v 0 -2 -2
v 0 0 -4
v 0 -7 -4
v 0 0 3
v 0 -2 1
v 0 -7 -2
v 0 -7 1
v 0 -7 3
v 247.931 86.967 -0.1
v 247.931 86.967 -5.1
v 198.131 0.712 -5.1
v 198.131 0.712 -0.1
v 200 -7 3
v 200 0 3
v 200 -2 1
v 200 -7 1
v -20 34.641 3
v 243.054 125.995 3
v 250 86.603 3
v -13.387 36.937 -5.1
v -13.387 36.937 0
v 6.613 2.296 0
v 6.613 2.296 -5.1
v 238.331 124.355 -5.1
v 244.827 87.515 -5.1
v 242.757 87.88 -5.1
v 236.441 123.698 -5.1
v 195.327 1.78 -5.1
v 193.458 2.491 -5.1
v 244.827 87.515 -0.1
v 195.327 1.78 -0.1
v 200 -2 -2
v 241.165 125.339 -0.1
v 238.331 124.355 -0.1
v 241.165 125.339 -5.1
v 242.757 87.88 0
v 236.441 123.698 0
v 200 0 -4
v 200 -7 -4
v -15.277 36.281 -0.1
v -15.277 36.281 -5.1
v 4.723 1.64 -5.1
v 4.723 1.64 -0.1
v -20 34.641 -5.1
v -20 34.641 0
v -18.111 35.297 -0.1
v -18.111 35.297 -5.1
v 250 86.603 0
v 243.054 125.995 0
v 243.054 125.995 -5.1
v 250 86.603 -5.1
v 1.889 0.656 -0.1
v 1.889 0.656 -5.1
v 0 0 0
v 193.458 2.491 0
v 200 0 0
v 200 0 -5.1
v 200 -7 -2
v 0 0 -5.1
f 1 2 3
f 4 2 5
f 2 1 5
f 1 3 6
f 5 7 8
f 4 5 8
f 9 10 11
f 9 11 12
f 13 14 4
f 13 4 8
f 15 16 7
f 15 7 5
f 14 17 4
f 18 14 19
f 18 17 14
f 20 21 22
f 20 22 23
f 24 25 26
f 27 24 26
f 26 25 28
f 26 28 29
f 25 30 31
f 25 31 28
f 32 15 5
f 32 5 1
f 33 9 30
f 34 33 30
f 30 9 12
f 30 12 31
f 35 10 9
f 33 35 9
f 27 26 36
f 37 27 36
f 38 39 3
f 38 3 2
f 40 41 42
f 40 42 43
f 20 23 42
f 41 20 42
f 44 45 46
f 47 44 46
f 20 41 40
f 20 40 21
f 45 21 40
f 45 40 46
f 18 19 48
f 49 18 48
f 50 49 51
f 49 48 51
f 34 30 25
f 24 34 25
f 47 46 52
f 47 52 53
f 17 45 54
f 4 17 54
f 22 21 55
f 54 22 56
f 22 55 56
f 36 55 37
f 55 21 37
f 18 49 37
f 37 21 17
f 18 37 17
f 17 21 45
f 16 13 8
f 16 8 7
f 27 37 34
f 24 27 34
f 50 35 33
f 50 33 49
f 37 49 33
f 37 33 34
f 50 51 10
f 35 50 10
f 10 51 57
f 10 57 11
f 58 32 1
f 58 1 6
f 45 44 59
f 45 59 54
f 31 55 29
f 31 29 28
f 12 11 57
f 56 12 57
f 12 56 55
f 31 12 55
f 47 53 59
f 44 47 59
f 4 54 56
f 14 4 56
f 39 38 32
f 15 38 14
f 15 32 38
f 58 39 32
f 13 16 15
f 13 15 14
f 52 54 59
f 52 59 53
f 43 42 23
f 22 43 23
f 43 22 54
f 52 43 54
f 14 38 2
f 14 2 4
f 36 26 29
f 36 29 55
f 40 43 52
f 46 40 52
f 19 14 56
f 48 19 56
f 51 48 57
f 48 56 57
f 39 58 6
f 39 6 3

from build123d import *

# Parameters (mm, degrees)
F1_DEPTH = 3


with BuildPart() as f1:
    # F0 (on Top) → F1 (new body)
    with BuildSketch(Plane.XY):
        Polygon((243.0540728933, 125.9948504989), (-20, 34.6410161514), (0, 0), (200, 0), (250, 86.6025403784), align=None)
    extrude(amount=F1_DEPTH)

    # F4: sweep along a path in F4_path
    with BuildLine(Plane(origin=(0, 0, 0), x_dir=(0.5, -0.8660254038, 0), z_dir=(0.8660254038, 0.5, 0))) as f4_path:
        Line((0, 0), (-40, 0))
    # F2 (on face) → F4 (sweep)
    with BuildSketch(Plane(origin=(-12.8879339993, 37.1109056769, 0), x_dir=(-0.9446562877, -0.3280617292, 0), z_dir=(-0.3280617292, 0.9446562877, 0))):
        Polygon((7.5287340946, -5.1), (7.5287340946, 0), (0.5287340946, 0), (0.5287340946, -5.1), (2.5287340946, -5.1), (2.5287340946, -0.1), (5.5287340946, -0.1), (5.5287340946, -5.1), align=None)
    sweep(path=f4_path.line)

    # F6: sweep along a path in F6_path
    with BuildLine(Plane(origin=(250, 86.6025403784, 0), x_dir=(0, -1, 0), z_dir=(0, 0, -1))) as f6_path:
        Line((-39.3923101205, 6.9459271067), (0, 0))
        Line((0, 0), (86.6025403784, 50))
    # F3 (on face) → F6 (sweep)
    with BuildSketch(Plane(origin=(-12.8879339993, 37.1109056769, 0), x_dir=(-0.9446562877, -0.3280617292, 0), z_dir=(-0.3280617292, 0.9446562877, 0))):
        Polygon((-263.9366467264, 0), (-270.9366467264, 0), (-270.9366467264, -5.1), (-268.9366467264, -5.1), (-268.9366467264, -0.1), (-265.9366467264, -0.1), (-265.9366467264, -5.1), (-263.9366467264, -5.1), align=None)
    sweep(path=f6_path.line, transition=Transition.RIGHT)


with BuildPart() as f7:
    # F7: sweep along a path in F7_path
    with BuildLine(Plane(origin=(0, 0, 3), x_dir=(0, 1, 0), z_dir=(0, 0, 1))) as f7_path:
        Line((0, 0), (0, -200))
    # F5 (on Right) → F7 (sweep)
    with BuildSketch(Plane.YZ):
        Polygon((0, 0), (0, 3), (-7, 3), (-7, 1), (-2, 1), (-2, -2), (-7, -2), (-7, -4), (0, -4), align=None)
    sweep(path=f7_path.line)


solid = Compound([f1.part, f7.part])
